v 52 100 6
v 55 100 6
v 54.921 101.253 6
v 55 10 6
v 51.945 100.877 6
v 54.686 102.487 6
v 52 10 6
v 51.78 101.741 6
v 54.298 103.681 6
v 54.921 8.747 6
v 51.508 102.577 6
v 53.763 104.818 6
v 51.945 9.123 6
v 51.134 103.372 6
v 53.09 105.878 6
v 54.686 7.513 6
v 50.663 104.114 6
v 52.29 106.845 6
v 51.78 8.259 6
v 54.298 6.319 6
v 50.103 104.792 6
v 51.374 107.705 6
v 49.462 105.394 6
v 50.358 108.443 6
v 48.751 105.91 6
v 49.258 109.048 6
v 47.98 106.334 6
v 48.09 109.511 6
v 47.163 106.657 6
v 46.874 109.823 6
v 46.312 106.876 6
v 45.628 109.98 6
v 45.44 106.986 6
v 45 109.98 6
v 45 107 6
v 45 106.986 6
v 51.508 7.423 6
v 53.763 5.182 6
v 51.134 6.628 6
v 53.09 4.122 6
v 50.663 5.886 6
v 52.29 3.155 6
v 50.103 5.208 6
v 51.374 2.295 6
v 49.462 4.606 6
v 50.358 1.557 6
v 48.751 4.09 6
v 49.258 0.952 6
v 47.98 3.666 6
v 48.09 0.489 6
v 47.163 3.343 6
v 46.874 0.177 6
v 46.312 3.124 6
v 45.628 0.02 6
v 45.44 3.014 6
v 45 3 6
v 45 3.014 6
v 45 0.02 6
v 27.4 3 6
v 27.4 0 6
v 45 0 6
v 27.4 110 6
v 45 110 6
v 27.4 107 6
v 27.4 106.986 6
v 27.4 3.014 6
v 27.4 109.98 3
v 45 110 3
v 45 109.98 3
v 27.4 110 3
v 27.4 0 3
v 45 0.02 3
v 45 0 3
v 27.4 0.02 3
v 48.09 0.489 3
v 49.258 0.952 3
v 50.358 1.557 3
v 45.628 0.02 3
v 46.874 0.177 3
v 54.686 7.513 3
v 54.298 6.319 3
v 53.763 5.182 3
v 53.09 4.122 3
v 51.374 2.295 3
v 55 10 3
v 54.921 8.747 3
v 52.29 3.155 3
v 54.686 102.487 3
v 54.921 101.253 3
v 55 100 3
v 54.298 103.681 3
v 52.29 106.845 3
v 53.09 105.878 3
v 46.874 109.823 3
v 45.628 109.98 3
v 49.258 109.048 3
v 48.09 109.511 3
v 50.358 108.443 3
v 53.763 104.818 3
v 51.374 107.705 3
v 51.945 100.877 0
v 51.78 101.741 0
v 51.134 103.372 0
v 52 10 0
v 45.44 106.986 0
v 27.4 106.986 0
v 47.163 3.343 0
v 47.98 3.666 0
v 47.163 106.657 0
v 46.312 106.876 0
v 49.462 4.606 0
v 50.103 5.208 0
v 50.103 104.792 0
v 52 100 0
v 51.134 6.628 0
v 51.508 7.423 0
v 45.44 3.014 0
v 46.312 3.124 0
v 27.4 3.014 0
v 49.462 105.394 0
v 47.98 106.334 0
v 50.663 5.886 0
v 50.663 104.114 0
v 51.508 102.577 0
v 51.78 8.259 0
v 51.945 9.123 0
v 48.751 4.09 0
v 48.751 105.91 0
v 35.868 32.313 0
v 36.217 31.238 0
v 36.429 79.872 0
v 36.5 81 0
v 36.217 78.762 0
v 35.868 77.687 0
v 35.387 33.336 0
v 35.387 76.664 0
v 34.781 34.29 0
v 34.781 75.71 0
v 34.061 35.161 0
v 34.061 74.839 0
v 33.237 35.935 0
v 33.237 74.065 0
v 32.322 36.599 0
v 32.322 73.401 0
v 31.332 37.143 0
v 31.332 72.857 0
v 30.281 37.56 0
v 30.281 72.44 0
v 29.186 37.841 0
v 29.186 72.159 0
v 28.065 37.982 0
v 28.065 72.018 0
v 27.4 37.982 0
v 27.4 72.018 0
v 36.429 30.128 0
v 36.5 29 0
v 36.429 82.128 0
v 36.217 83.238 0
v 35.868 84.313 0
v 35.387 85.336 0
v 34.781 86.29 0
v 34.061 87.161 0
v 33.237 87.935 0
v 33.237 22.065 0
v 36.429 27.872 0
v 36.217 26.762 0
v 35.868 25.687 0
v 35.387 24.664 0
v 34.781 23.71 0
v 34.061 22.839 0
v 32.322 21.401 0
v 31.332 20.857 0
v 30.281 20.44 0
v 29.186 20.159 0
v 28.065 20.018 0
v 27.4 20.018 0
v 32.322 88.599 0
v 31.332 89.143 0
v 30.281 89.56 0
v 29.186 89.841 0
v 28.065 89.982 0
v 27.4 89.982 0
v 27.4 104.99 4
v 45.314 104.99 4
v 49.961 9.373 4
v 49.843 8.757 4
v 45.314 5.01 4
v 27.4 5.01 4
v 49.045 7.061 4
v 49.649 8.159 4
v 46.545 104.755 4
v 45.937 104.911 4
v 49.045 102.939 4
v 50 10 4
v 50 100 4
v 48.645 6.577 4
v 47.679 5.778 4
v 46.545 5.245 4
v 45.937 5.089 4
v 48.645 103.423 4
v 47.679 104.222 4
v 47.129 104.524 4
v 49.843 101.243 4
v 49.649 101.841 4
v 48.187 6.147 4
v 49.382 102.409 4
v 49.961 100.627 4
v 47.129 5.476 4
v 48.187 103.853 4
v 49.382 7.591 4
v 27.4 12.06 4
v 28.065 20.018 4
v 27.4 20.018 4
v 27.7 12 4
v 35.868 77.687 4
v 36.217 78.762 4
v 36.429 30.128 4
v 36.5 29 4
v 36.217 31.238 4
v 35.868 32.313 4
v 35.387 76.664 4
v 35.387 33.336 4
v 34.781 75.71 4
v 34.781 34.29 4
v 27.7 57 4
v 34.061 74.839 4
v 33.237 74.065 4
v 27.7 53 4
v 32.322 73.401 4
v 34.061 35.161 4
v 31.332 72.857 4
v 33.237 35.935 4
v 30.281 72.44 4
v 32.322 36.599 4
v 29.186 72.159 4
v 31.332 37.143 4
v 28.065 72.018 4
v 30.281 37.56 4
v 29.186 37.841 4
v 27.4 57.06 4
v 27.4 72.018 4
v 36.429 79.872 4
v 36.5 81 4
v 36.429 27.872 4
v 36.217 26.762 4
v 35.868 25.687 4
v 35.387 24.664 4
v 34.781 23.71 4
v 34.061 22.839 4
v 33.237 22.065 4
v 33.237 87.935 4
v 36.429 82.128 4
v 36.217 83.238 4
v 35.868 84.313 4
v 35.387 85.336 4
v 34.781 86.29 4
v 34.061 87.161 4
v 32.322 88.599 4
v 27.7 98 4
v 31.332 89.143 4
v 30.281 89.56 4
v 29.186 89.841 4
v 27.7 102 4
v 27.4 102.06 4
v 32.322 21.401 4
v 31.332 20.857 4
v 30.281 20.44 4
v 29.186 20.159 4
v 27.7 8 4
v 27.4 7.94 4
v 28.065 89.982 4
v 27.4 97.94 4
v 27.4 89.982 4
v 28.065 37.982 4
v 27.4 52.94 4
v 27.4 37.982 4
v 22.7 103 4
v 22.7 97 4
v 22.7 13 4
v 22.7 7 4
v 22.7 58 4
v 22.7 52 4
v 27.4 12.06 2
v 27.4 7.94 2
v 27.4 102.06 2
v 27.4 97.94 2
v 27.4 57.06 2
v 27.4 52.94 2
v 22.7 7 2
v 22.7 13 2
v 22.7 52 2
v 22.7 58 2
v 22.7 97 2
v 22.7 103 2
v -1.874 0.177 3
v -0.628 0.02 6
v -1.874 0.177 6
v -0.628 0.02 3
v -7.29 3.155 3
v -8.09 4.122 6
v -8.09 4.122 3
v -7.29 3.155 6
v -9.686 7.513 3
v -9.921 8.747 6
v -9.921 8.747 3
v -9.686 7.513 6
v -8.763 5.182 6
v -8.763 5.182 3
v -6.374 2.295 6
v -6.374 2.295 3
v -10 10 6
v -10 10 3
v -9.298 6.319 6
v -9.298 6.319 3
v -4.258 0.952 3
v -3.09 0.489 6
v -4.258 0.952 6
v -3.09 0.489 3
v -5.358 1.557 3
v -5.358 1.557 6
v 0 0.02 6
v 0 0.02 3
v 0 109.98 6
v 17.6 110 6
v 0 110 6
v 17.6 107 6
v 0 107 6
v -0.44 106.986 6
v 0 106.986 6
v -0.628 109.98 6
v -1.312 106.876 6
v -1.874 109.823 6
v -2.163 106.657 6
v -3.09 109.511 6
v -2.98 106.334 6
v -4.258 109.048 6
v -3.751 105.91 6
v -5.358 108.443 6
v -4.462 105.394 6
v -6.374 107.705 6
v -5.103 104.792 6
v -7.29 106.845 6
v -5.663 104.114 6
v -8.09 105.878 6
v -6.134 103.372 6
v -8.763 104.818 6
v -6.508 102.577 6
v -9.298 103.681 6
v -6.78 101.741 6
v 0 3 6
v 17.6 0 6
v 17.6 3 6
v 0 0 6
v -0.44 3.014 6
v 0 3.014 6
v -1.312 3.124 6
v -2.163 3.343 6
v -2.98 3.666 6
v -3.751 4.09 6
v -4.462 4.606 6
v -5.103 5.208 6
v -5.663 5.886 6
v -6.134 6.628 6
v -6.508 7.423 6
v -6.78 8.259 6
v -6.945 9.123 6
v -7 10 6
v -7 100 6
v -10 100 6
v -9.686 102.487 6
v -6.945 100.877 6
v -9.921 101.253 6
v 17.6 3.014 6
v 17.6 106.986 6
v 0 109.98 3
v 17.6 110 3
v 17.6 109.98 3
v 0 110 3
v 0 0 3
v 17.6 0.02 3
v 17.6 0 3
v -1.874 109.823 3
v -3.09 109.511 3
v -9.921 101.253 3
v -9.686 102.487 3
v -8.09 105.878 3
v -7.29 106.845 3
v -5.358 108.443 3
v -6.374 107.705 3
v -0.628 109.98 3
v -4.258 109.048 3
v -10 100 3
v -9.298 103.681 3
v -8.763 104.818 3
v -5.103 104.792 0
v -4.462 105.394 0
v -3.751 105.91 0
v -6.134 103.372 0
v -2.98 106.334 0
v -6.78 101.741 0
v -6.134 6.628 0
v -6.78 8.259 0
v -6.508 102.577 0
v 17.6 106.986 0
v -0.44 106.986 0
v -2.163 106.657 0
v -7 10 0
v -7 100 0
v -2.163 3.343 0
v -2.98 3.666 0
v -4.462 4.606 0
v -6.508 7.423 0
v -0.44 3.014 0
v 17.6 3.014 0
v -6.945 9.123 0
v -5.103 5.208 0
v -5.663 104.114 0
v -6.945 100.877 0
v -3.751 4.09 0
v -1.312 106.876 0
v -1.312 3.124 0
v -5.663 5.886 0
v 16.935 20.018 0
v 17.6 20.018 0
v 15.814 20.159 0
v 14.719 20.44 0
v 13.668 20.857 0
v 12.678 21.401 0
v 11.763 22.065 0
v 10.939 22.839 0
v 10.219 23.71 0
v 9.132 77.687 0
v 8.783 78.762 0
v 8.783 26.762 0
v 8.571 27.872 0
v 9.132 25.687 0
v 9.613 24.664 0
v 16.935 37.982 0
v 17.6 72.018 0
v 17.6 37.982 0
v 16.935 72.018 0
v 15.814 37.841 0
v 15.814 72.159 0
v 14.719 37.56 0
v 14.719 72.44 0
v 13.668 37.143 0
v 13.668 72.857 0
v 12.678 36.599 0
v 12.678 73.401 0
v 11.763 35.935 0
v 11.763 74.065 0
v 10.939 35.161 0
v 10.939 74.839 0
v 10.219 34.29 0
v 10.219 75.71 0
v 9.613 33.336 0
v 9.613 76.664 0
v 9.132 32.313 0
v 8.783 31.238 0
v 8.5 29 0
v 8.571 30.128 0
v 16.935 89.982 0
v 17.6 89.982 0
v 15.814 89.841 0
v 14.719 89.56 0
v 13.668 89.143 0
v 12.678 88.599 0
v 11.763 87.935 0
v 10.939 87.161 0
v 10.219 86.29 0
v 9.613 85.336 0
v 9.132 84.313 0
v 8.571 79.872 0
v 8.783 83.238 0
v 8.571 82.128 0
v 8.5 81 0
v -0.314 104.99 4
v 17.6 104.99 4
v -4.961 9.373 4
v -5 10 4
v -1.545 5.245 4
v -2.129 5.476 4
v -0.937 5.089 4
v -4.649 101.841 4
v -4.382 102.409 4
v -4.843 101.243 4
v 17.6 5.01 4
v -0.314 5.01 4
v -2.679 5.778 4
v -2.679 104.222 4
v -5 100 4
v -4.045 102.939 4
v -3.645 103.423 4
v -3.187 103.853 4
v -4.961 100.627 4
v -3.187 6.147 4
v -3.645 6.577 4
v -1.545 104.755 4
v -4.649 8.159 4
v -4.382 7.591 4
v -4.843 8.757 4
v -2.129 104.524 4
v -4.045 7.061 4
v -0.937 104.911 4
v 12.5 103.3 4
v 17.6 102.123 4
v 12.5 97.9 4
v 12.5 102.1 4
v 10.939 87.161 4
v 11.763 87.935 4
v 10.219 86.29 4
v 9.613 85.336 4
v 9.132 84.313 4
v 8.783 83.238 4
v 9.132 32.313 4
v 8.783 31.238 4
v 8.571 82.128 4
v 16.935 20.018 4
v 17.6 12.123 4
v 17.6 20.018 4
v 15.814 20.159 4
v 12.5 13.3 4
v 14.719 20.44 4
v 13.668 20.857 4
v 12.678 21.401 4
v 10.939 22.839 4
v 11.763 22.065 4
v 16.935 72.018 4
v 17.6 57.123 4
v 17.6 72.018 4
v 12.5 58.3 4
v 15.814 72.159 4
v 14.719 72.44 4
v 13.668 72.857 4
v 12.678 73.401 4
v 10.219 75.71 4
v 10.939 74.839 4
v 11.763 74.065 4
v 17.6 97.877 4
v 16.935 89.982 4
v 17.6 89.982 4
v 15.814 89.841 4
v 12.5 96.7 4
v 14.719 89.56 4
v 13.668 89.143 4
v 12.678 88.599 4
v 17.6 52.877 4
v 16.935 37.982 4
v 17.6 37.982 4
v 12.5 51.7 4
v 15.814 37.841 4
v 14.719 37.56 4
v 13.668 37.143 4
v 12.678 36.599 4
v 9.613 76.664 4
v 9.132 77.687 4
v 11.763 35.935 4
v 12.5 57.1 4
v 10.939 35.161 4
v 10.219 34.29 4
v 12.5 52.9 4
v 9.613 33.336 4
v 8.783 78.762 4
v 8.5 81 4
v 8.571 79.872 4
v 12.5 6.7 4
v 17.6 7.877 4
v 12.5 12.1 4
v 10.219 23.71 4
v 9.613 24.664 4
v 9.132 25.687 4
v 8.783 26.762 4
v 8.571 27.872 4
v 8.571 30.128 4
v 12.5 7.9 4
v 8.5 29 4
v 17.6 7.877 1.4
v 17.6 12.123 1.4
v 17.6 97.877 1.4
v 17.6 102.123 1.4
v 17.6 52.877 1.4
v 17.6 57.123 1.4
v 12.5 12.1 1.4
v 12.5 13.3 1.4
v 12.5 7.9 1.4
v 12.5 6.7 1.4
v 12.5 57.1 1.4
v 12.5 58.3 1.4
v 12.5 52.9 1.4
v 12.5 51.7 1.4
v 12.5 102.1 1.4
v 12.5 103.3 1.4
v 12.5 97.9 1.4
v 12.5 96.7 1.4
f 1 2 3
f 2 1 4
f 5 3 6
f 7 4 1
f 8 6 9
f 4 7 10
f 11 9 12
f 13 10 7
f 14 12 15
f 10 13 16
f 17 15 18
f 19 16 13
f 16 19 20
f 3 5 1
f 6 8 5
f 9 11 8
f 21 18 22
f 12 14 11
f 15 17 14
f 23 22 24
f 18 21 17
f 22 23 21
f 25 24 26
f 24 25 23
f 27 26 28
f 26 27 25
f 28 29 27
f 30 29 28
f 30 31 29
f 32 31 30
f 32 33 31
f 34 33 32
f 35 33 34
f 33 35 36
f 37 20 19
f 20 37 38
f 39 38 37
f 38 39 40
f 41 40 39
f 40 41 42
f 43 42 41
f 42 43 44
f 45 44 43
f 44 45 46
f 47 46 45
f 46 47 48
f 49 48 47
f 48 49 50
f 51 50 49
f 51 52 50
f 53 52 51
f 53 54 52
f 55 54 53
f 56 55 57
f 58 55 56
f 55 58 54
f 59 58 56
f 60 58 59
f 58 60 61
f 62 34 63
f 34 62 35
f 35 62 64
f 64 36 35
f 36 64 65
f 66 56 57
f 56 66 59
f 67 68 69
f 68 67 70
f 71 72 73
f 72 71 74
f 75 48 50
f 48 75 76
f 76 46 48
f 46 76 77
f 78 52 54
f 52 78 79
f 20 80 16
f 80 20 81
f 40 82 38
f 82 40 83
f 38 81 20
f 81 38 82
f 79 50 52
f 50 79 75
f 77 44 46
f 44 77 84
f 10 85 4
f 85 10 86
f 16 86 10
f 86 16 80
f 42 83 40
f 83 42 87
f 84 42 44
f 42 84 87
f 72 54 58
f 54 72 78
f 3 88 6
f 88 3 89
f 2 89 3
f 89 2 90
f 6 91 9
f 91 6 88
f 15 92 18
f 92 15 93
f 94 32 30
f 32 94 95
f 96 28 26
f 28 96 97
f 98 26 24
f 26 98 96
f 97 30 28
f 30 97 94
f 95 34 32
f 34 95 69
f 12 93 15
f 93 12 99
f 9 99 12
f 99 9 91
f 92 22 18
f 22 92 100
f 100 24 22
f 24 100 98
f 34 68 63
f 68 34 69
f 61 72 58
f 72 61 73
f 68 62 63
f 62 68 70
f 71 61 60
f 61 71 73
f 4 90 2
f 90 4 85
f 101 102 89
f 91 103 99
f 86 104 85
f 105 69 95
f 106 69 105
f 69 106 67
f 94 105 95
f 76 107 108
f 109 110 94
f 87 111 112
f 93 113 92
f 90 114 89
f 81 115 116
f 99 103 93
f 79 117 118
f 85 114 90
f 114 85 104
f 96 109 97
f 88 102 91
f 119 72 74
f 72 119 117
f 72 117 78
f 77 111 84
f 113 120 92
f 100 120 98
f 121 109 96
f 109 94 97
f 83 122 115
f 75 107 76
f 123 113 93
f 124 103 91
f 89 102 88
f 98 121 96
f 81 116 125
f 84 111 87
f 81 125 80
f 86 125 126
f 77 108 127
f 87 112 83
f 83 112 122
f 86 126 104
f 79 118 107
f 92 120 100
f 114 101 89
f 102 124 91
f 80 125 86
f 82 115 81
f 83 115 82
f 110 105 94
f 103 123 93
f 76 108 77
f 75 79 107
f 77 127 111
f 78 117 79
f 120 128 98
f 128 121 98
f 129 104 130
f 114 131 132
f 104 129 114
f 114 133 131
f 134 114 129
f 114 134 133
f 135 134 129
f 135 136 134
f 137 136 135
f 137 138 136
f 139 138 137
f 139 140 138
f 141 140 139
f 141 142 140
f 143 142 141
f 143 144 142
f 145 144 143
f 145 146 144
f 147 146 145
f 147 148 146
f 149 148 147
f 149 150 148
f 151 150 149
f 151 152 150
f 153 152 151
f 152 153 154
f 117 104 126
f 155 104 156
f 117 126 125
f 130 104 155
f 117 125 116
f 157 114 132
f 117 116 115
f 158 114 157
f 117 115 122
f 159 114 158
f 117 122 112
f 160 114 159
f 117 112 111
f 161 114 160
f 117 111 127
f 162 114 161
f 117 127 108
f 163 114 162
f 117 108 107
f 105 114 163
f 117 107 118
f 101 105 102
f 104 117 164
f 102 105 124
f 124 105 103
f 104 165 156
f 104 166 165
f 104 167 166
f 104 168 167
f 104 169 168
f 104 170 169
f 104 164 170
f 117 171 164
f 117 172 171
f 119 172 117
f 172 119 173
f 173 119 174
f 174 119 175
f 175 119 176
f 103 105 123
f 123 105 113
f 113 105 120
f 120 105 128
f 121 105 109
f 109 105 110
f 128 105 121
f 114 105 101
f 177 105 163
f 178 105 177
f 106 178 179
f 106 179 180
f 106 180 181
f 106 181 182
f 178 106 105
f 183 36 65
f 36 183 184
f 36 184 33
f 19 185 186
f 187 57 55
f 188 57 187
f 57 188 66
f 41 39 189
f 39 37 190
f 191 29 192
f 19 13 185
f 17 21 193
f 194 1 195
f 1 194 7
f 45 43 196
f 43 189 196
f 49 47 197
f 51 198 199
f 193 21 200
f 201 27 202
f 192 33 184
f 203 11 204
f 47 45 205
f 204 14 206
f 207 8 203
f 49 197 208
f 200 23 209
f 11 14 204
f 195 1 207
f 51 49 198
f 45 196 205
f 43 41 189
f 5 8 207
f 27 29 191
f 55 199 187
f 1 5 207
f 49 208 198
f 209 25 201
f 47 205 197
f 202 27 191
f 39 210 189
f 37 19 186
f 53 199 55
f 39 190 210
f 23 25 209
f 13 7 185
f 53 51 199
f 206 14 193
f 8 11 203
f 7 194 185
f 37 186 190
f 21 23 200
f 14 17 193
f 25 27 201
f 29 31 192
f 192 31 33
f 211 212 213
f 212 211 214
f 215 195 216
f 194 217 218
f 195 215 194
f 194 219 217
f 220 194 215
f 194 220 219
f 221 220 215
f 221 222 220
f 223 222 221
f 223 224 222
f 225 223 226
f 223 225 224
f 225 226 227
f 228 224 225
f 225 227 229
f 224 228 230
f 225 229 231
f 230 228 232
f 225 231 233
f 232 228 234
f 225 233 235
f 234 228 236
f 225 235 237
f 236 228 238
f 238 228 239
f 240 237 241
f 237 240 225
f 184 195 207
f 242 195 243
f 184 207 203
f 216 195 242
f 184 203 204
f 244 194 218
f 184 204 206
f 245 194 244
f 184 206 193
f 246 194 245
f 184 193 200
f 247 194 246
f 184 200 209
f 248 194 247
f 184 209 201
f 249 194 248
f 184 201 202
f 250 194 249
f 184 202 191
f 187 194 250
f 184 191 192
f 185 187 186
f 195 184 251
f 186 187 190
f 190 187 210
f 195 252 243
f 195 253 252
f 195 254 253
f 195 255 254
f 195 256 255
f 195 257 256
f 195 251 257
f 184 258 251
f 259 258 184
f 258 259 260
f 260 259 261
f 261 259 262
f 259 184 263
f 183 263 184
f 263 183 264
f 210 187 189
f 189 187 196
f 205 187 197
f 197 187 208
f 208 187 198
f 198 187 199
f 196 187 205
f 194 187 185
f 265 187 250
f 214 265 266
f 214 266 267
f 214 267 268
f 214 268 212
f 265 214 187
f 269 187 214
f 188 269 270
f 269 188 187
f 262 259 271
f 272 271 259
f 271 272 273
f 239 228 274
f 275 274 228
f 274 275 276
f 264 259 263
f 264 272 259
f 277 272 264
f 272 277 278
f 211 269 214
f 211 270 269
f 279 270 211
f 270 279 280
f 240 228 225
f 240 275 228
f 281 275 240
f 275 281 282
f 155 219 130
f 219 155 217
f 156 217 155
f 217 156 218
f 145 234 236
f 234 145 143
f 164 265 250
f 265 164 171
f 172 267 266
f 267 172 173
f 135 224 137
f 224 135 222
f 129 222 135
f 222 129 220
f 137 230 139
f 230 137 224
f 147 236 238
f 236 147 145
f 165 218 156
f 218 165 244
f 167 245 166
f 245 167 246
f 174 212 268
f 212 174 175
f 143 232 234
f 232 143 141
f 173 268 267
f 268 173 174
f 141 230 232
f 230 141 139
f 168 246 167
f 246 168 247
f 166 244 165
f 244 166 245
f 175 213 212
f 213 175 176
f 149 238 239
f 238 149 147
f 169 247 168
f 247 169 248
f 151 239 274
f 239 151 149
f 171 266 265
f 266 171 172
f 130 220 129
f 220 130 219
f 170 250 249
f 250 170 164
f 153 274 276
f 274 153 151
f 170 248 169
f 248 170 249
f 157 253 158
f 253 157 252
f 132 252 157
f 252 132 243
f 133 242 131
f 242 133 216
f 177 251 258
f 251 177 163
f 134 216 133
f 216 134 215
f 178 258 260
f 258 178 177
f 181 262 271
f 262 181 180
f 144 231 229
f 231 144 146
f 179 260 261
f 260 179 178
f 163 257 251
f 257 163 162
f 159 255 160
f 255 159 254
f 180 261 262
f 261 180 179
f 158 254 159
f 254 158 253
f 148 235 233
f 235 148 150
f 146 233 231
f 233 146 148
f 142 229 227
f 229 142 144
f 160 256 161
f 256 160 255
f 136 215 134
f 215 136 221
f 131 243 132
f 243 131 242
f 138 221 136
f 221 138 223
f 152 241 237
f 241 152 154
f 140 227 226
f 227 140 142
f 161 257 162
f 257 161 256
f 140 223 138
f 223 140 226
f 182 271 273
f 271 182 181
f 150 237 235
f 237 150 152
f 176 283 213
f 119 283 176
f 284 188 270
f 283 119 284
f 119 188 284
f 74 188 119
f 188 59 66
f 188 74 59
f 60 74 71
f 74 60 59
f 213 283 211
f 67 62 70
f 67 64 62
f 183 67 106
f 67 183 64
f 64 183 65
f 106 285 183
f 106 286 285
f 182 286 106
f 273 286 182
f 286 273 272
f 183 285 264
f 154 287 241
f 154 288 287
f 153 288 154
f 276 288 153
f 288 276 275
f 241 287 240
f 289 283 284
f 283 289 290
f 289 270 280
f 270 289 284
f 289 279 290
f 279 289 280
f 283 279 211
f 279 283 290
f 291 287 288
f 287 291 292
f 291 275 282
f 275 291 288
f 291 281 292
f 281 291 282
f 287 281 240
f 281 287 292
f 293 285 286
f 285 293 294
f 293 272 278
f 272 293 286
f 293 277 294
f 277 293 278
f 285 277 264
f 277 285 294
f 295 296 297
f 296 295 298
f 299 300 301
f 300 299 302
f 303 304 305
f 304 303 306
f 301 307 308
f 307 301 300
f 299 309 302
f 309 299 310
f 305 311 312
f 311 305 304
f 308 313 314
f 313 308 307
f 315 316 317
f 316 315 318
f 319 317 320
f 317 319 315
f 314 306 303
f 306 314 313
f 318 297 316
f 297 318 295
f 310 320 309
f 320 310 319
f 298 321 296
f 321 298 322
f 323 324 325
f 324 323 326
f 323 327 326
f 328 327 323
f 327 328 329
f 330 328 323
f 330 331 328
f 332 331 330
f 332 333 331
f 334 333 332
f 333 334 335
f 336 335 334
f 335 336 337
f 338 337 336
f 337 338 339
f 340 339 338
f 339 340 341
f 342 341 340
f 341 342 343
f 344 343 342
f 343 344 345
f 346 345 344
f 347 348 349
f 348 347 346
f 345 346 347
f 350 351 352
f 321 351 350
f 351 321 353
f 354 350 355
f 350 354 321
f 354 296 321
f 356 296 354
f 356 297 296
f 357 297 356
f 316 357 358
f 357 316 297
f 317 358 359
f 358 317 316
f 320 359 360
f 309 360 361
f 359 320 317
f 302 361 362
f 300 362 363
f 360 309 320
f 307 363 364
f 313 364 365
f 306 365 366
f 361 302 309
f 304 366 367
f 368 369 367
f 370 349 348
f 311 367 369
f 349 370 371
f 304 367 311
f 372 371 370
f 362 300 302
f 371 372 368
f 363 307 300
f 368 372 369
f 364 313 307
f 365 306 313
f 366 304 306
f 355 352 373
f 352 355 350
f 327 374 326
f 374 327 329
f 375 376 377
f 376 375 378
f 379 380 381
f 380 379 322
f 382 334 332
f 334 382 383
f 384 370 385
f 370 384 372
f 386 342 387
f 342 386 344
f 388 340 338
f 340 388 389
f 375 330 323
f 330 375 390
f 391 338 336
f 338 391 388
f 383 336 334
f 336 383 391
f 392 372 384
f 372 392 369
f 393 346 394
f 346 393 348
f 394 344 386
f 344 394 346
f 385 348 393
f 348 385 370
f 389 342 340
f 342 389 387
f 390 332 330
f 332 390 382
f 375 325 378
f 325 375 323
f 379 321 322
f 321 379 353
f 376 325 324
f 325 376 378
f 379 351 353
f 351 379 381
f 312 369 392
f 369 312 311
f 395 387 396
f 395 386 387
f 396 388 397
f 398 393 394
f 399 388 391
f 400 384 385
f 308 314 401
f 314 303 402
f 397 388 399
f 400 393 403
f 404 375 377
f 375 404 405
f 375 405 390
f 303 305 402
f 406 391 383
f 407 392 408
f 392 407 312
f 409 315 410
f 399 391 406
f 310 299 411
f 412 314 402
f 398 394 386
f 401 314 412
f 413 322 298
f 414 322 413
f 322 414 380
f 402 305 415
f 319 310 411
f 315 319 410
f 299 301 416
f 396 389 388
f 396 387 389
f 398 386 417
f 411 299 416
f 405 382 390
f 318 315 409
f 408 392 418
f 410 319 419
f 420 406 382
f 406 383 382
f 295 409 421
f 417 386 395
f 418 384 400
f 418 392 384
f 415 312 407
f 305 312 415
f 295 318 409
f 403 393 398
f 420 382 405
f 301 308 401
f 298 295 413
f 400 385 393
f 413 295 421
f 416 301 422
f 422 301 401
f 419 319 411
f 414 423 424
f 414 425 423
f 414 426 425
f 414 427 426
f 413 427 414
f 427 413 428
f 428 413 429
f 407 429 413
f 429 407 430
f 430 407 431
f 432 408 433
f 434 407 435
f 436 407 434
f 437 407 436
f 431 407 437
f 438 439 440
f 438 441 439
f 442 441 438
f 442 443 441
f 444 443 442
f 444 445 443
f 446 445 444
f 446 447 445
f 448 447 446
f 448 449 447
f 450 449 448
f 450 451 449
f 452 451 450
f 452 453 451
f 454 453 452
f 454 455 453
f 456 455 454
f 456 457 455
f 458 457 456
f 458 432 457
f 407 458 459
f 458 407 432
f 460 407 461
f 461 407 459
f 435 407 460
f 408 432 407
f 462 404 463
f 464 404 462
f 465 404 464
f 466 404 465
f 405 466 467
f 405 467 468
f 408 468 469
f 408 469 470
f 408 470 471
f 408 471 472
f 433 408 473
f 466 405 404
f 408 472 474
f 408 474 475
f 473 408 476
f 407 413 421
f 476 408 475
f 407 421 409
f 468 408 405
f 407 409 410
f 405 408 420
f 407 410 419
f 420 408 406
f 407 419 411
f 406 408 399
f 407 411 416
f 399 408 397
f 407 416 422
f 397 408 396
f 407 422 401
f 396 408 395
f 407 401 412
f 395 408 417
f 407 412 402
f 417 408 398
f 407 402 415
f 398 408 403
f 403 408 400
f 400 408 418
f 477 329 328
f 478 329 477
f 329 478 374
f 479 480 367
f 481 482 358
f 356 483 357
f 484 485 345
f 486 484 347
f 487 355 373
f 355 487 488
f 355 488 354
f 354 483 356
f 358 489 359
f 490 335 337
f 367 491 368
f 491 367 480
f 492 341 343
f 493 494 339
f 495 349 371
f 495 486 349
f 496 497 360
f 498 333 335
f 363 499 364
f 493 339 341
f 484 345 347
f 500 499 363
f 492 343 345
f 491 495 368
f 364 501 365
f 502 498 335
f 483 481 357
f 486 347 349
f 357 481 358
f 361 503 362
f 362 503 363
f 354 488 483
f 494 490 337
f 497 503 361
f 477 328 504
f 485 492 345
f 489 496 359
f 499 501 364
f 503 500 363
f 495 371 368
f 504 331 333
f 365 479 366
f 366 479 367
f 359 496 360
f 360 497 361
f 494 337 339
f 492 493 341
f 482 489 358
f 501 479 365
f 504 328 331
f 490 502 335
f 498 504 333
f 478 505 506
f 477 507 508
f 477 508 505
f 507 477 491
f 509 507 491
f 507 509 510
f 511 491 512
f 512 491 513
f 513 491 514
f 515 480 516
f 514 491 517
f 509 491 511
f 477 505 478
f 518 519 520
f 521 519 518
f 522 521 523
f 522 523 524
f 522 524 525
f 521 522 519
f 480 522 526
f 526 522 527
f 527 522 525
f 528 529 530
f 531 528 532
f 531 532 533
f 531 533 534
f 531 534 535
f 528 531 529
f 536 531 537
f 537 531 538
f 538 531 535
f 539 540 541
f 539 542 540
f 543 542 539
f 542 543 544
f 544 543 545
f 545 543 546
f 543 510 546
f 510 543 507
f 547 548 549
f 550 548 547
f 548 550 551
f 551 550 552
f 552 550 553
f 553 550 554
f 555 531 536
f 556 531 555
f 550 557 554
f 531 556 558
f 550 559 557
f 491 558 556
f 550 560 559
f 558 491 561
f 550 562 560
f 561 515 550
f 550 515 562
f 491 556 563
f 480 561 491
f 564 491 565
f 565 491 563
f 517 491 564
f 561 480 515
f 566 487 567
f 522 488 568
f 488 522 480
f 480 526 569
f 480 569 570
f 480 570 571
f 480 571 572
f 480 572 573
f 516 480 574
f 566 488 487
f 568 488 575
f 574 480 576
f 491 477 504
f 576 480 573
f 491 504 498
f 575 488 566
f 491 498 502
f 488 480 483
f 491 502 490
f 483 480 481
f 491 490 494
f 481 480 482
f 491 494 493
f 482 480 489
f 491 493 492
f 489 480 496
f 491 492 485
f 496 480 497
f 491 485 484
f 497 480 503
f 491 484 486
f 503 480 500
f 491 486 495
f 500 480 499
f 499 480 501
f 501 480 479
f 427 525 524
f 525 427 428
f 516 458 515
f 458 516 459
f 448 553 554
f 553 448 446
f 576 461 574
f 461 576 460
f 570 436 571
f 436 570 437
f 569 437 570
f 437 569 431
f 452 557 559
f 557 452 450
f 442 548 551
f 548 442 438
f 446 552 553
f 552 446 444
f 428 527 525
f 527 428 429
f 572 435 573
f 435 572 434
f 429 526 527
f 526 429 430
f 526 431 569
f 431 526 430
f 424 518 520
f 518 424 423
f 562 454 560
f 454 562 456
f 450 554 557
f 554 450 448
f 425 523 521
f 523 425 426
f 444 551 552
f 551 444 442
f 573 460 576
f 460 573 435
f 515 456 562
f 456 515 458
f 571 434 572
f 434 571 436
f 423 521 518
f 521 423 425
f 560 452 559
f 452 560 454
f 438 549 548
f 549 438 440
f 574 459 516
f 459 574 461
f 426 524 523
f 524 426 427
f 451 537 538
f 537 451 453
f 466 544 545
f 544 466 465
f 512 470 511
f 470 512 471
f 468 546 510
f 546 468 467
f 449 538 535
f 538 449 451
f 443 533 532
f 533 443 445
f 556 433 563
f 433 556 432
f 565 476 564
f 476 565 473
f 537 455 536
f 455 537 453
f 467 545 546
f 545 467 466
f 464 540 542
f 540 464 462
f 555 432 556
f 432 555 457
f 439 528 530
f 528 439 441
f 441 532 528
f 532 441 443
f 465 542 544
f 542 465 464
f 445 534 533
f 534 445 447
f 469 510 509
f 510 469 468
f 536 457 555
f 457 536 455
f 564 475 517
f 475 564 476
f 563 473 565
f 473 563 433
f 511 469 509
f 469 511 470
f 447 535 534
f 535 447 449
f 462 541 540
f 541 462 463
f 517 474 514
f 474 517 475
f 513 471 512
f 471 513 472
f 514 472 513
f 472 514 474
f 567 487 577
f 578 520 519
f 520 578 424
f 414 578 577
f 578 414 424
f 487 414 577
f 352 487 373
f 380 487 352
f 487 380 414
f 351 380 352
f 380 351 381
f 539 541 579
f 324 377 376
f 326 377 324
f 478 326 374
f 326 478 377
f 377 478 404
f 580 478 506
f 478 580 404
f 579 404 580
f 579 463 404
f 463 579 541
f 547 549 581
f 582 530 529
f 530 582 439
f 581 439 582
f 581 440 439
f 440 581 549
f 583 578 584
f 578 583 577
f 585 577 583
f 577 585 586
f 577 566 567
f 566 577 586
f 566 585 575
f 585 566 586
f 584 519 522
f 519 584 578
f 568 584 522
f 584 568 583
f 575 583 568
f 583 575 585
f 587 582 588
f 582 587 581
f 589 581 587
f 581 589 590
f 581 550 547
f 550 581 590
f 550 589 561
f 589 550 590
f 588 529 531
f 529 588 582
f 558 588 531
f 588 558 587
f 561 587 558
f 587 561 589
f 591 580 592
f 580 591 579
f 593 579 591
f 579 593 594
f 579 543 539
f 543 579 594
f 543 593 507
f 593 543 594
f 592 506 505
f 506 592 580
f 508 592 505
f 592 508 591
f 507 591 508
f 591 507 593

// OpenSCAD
// file: cfg.scad
function get_h() = 6;
function get_width() = 55;
function get_length() = 110;
function get_diameter() = 18;
function get_distance() = 52;
function get_nutDistance() = 10;
function get_separation() = 10;
function get_offset_l() = 0;
function get_offset_r() = 0;
// file: _cfg.scad
// Global configuration functions
function get_fn() = 50;
function get_darft() = false;
// file: base.scad
module base(h, width, length, diameter, distance, offset_l=0, offset_r=0, fn) {
    corner_radius=10;

    difference() {
        union() {
            difference() {
                _base_plate_shape(corner_radius, h, width, length, fn);
                translate([3,3,h-2]) {
                    offset=3;
                    _base_plate_shape(corner_radius-offset, h-2, width-offset*2, length-offset*2, fn);
                }
            }
        }

        translate([width/2, length/2-distance/2, -.1]) {
            translate([offset_l, 0, 0])
            cylinder(d=diameter, h=h+.2, center=false, $fn=fn);
            translate([offset_r, distance, 0]) {
                cylinder(d=diameter, h=h+.2, center=false, $fn=fn);
            }
        }
    }
}

module rounded_top_only(corner_radius, h, width, length, fn) {
    minkowski() {
        _base_plate_shape(corner_radius, h - corner_radius, width, length, fn);
        translate([0, 0, corner_radius]) cylinder(r=corner_radius/2, h=0.001, $fn=fn);
    }
}

module _base_plate_shape(corner_radius, h, width, length, fn) {
    hs=h/2;
    hn=h-hs;

    translate([0, 0, hs])

    union() {
        translate([corner_radius, 0, 0])
            cube([width - corner_radius * 2, length, hn], center=false);

        translate([0, corner_radius, 0])
            cube([width, length - corner_radius * 2, hn], center=false);

        for (x = [corner_radius, width - corner_radius])
        for (y = [corner_radius, length - corner_radius])
        translate([x, y, 0])
            cylinder(d = corner_radius * 2, h = hn, center = false, $fn = fn);

        // -------

        hull() {
            for (x = [corner_radius, width - corner_radius])
            for (y = [corner_radius, length - corner_radius])
            translate([x, y, 0])
                translate([0, 0, -hs])
                    cylinder(r1=corner_radius-hs, r2=corner_radius, h = hs, center = false, $fn = fn);
        }
    }
}

module nut(h,extend=0) {
    nut_height=h;
    nut_width=5+extend;
    nut_length=4+extend;
    nut_length_=1+extend;
    rotate([0,0,90]) {
        translate([-nut_length/2,0,0]) {
            linear_extrude(height=nut_height)
                polygon(points=[[0,0], [-nut_length_,nut_width], [0,nut_width]]);

            translate([nut_length,0,0]) {
                linear_extrude(height=nut_height)
                    polygon(points=[[0,0], [nut_length_,nut_width], [0,nut_width]]);
            }

            cube([nut_length, nut_width, nut_height], center=false);
        }
    }
}

module both(h, width, length, diameter, distance, nutDistance, separation, offset_l=0, offset_r=0, fn, draft=false) {
    difference() {
        union() {
            left(h, width, length, diameter, distance, nutDistance, offset_l, offset_r, fn);

            translate([-separation, 0, 0])
                right(h, width, length, diameter, distance, nutDistance, offset_l, offset_r, fn);
        }

    if (draft) {
        translate([-separation,0,3])
            cube([width+separation,length,10],center=false);

        translate([-separation,0,-8])
            cube([width+separation,length,10],center=false);
    }
    }
}

module left(h, width, length, diameter, distance, nutDistance, offset_l=0, offset_r=0, fn) {
    union() {
        translate([0, 0, 0]) {
            difference() {
                base(h, width, length, diameter, distance, offset_l, offset_r, fn);
                translate([-.1, -.1, -.1]) {
                    cube([width / 2, length + .2, h + .2], center = false);
                }
            }
        }

        translate([0.2,0,2])
            translate([width / 2, 0, 0]) {
                translate([0, nutDistance, 0]) {
                    nut(h - 4);
                }
                translate([0, length / 2, 0]) {
                    nut(h - 4);
                }
                translate([0, length - nutDistance, 0]) {
                    nut(h - 4);
                }
            }
    }
}

module right(h, width, length, diameter, distance, nutDistance, offset_l=0, offset_r=0, fn) {
    difference() {
        union() {
            difference() {
                base(h, width, length, diameter, distance, offset_l, offset_r, fn);
                translate([width / 2 + .1, -.1, -.1]) {
                    cube([width / 2, length + .2, h + .2], center = false);
                }
            }
        }

        translate([0.2,0,1.5])
            translate([width / 2 , 0, -.1]) {
                translate([0, nutDistance, 0]) {
                    nut(h - 1.3, extend = .2);
                }
                translate([0, length / 2, 0]) {
                    nut(h - 1.3, extend = .2);
                }
                translate([0, length - nutDistance, 0]) {
                    nut(h - 1.3, extend =  .2);
                }
            }
    }
}
// main file
use <./base.scad>
use <./_cfg.scad>
use <./cfg.scad>

both(
    h=get_h(),
    width=get_width(),
    length=get_length(),
    diameter=get_diameter(),
    distance=get_distance(),
    nutDistance=get_nutDistance(),
    separation=get_separation(),
    offset_l=get_offset_l(),
    offset_r=get_offset_r(),
    fn=get_fn(),
    draft=get_darft()
);
